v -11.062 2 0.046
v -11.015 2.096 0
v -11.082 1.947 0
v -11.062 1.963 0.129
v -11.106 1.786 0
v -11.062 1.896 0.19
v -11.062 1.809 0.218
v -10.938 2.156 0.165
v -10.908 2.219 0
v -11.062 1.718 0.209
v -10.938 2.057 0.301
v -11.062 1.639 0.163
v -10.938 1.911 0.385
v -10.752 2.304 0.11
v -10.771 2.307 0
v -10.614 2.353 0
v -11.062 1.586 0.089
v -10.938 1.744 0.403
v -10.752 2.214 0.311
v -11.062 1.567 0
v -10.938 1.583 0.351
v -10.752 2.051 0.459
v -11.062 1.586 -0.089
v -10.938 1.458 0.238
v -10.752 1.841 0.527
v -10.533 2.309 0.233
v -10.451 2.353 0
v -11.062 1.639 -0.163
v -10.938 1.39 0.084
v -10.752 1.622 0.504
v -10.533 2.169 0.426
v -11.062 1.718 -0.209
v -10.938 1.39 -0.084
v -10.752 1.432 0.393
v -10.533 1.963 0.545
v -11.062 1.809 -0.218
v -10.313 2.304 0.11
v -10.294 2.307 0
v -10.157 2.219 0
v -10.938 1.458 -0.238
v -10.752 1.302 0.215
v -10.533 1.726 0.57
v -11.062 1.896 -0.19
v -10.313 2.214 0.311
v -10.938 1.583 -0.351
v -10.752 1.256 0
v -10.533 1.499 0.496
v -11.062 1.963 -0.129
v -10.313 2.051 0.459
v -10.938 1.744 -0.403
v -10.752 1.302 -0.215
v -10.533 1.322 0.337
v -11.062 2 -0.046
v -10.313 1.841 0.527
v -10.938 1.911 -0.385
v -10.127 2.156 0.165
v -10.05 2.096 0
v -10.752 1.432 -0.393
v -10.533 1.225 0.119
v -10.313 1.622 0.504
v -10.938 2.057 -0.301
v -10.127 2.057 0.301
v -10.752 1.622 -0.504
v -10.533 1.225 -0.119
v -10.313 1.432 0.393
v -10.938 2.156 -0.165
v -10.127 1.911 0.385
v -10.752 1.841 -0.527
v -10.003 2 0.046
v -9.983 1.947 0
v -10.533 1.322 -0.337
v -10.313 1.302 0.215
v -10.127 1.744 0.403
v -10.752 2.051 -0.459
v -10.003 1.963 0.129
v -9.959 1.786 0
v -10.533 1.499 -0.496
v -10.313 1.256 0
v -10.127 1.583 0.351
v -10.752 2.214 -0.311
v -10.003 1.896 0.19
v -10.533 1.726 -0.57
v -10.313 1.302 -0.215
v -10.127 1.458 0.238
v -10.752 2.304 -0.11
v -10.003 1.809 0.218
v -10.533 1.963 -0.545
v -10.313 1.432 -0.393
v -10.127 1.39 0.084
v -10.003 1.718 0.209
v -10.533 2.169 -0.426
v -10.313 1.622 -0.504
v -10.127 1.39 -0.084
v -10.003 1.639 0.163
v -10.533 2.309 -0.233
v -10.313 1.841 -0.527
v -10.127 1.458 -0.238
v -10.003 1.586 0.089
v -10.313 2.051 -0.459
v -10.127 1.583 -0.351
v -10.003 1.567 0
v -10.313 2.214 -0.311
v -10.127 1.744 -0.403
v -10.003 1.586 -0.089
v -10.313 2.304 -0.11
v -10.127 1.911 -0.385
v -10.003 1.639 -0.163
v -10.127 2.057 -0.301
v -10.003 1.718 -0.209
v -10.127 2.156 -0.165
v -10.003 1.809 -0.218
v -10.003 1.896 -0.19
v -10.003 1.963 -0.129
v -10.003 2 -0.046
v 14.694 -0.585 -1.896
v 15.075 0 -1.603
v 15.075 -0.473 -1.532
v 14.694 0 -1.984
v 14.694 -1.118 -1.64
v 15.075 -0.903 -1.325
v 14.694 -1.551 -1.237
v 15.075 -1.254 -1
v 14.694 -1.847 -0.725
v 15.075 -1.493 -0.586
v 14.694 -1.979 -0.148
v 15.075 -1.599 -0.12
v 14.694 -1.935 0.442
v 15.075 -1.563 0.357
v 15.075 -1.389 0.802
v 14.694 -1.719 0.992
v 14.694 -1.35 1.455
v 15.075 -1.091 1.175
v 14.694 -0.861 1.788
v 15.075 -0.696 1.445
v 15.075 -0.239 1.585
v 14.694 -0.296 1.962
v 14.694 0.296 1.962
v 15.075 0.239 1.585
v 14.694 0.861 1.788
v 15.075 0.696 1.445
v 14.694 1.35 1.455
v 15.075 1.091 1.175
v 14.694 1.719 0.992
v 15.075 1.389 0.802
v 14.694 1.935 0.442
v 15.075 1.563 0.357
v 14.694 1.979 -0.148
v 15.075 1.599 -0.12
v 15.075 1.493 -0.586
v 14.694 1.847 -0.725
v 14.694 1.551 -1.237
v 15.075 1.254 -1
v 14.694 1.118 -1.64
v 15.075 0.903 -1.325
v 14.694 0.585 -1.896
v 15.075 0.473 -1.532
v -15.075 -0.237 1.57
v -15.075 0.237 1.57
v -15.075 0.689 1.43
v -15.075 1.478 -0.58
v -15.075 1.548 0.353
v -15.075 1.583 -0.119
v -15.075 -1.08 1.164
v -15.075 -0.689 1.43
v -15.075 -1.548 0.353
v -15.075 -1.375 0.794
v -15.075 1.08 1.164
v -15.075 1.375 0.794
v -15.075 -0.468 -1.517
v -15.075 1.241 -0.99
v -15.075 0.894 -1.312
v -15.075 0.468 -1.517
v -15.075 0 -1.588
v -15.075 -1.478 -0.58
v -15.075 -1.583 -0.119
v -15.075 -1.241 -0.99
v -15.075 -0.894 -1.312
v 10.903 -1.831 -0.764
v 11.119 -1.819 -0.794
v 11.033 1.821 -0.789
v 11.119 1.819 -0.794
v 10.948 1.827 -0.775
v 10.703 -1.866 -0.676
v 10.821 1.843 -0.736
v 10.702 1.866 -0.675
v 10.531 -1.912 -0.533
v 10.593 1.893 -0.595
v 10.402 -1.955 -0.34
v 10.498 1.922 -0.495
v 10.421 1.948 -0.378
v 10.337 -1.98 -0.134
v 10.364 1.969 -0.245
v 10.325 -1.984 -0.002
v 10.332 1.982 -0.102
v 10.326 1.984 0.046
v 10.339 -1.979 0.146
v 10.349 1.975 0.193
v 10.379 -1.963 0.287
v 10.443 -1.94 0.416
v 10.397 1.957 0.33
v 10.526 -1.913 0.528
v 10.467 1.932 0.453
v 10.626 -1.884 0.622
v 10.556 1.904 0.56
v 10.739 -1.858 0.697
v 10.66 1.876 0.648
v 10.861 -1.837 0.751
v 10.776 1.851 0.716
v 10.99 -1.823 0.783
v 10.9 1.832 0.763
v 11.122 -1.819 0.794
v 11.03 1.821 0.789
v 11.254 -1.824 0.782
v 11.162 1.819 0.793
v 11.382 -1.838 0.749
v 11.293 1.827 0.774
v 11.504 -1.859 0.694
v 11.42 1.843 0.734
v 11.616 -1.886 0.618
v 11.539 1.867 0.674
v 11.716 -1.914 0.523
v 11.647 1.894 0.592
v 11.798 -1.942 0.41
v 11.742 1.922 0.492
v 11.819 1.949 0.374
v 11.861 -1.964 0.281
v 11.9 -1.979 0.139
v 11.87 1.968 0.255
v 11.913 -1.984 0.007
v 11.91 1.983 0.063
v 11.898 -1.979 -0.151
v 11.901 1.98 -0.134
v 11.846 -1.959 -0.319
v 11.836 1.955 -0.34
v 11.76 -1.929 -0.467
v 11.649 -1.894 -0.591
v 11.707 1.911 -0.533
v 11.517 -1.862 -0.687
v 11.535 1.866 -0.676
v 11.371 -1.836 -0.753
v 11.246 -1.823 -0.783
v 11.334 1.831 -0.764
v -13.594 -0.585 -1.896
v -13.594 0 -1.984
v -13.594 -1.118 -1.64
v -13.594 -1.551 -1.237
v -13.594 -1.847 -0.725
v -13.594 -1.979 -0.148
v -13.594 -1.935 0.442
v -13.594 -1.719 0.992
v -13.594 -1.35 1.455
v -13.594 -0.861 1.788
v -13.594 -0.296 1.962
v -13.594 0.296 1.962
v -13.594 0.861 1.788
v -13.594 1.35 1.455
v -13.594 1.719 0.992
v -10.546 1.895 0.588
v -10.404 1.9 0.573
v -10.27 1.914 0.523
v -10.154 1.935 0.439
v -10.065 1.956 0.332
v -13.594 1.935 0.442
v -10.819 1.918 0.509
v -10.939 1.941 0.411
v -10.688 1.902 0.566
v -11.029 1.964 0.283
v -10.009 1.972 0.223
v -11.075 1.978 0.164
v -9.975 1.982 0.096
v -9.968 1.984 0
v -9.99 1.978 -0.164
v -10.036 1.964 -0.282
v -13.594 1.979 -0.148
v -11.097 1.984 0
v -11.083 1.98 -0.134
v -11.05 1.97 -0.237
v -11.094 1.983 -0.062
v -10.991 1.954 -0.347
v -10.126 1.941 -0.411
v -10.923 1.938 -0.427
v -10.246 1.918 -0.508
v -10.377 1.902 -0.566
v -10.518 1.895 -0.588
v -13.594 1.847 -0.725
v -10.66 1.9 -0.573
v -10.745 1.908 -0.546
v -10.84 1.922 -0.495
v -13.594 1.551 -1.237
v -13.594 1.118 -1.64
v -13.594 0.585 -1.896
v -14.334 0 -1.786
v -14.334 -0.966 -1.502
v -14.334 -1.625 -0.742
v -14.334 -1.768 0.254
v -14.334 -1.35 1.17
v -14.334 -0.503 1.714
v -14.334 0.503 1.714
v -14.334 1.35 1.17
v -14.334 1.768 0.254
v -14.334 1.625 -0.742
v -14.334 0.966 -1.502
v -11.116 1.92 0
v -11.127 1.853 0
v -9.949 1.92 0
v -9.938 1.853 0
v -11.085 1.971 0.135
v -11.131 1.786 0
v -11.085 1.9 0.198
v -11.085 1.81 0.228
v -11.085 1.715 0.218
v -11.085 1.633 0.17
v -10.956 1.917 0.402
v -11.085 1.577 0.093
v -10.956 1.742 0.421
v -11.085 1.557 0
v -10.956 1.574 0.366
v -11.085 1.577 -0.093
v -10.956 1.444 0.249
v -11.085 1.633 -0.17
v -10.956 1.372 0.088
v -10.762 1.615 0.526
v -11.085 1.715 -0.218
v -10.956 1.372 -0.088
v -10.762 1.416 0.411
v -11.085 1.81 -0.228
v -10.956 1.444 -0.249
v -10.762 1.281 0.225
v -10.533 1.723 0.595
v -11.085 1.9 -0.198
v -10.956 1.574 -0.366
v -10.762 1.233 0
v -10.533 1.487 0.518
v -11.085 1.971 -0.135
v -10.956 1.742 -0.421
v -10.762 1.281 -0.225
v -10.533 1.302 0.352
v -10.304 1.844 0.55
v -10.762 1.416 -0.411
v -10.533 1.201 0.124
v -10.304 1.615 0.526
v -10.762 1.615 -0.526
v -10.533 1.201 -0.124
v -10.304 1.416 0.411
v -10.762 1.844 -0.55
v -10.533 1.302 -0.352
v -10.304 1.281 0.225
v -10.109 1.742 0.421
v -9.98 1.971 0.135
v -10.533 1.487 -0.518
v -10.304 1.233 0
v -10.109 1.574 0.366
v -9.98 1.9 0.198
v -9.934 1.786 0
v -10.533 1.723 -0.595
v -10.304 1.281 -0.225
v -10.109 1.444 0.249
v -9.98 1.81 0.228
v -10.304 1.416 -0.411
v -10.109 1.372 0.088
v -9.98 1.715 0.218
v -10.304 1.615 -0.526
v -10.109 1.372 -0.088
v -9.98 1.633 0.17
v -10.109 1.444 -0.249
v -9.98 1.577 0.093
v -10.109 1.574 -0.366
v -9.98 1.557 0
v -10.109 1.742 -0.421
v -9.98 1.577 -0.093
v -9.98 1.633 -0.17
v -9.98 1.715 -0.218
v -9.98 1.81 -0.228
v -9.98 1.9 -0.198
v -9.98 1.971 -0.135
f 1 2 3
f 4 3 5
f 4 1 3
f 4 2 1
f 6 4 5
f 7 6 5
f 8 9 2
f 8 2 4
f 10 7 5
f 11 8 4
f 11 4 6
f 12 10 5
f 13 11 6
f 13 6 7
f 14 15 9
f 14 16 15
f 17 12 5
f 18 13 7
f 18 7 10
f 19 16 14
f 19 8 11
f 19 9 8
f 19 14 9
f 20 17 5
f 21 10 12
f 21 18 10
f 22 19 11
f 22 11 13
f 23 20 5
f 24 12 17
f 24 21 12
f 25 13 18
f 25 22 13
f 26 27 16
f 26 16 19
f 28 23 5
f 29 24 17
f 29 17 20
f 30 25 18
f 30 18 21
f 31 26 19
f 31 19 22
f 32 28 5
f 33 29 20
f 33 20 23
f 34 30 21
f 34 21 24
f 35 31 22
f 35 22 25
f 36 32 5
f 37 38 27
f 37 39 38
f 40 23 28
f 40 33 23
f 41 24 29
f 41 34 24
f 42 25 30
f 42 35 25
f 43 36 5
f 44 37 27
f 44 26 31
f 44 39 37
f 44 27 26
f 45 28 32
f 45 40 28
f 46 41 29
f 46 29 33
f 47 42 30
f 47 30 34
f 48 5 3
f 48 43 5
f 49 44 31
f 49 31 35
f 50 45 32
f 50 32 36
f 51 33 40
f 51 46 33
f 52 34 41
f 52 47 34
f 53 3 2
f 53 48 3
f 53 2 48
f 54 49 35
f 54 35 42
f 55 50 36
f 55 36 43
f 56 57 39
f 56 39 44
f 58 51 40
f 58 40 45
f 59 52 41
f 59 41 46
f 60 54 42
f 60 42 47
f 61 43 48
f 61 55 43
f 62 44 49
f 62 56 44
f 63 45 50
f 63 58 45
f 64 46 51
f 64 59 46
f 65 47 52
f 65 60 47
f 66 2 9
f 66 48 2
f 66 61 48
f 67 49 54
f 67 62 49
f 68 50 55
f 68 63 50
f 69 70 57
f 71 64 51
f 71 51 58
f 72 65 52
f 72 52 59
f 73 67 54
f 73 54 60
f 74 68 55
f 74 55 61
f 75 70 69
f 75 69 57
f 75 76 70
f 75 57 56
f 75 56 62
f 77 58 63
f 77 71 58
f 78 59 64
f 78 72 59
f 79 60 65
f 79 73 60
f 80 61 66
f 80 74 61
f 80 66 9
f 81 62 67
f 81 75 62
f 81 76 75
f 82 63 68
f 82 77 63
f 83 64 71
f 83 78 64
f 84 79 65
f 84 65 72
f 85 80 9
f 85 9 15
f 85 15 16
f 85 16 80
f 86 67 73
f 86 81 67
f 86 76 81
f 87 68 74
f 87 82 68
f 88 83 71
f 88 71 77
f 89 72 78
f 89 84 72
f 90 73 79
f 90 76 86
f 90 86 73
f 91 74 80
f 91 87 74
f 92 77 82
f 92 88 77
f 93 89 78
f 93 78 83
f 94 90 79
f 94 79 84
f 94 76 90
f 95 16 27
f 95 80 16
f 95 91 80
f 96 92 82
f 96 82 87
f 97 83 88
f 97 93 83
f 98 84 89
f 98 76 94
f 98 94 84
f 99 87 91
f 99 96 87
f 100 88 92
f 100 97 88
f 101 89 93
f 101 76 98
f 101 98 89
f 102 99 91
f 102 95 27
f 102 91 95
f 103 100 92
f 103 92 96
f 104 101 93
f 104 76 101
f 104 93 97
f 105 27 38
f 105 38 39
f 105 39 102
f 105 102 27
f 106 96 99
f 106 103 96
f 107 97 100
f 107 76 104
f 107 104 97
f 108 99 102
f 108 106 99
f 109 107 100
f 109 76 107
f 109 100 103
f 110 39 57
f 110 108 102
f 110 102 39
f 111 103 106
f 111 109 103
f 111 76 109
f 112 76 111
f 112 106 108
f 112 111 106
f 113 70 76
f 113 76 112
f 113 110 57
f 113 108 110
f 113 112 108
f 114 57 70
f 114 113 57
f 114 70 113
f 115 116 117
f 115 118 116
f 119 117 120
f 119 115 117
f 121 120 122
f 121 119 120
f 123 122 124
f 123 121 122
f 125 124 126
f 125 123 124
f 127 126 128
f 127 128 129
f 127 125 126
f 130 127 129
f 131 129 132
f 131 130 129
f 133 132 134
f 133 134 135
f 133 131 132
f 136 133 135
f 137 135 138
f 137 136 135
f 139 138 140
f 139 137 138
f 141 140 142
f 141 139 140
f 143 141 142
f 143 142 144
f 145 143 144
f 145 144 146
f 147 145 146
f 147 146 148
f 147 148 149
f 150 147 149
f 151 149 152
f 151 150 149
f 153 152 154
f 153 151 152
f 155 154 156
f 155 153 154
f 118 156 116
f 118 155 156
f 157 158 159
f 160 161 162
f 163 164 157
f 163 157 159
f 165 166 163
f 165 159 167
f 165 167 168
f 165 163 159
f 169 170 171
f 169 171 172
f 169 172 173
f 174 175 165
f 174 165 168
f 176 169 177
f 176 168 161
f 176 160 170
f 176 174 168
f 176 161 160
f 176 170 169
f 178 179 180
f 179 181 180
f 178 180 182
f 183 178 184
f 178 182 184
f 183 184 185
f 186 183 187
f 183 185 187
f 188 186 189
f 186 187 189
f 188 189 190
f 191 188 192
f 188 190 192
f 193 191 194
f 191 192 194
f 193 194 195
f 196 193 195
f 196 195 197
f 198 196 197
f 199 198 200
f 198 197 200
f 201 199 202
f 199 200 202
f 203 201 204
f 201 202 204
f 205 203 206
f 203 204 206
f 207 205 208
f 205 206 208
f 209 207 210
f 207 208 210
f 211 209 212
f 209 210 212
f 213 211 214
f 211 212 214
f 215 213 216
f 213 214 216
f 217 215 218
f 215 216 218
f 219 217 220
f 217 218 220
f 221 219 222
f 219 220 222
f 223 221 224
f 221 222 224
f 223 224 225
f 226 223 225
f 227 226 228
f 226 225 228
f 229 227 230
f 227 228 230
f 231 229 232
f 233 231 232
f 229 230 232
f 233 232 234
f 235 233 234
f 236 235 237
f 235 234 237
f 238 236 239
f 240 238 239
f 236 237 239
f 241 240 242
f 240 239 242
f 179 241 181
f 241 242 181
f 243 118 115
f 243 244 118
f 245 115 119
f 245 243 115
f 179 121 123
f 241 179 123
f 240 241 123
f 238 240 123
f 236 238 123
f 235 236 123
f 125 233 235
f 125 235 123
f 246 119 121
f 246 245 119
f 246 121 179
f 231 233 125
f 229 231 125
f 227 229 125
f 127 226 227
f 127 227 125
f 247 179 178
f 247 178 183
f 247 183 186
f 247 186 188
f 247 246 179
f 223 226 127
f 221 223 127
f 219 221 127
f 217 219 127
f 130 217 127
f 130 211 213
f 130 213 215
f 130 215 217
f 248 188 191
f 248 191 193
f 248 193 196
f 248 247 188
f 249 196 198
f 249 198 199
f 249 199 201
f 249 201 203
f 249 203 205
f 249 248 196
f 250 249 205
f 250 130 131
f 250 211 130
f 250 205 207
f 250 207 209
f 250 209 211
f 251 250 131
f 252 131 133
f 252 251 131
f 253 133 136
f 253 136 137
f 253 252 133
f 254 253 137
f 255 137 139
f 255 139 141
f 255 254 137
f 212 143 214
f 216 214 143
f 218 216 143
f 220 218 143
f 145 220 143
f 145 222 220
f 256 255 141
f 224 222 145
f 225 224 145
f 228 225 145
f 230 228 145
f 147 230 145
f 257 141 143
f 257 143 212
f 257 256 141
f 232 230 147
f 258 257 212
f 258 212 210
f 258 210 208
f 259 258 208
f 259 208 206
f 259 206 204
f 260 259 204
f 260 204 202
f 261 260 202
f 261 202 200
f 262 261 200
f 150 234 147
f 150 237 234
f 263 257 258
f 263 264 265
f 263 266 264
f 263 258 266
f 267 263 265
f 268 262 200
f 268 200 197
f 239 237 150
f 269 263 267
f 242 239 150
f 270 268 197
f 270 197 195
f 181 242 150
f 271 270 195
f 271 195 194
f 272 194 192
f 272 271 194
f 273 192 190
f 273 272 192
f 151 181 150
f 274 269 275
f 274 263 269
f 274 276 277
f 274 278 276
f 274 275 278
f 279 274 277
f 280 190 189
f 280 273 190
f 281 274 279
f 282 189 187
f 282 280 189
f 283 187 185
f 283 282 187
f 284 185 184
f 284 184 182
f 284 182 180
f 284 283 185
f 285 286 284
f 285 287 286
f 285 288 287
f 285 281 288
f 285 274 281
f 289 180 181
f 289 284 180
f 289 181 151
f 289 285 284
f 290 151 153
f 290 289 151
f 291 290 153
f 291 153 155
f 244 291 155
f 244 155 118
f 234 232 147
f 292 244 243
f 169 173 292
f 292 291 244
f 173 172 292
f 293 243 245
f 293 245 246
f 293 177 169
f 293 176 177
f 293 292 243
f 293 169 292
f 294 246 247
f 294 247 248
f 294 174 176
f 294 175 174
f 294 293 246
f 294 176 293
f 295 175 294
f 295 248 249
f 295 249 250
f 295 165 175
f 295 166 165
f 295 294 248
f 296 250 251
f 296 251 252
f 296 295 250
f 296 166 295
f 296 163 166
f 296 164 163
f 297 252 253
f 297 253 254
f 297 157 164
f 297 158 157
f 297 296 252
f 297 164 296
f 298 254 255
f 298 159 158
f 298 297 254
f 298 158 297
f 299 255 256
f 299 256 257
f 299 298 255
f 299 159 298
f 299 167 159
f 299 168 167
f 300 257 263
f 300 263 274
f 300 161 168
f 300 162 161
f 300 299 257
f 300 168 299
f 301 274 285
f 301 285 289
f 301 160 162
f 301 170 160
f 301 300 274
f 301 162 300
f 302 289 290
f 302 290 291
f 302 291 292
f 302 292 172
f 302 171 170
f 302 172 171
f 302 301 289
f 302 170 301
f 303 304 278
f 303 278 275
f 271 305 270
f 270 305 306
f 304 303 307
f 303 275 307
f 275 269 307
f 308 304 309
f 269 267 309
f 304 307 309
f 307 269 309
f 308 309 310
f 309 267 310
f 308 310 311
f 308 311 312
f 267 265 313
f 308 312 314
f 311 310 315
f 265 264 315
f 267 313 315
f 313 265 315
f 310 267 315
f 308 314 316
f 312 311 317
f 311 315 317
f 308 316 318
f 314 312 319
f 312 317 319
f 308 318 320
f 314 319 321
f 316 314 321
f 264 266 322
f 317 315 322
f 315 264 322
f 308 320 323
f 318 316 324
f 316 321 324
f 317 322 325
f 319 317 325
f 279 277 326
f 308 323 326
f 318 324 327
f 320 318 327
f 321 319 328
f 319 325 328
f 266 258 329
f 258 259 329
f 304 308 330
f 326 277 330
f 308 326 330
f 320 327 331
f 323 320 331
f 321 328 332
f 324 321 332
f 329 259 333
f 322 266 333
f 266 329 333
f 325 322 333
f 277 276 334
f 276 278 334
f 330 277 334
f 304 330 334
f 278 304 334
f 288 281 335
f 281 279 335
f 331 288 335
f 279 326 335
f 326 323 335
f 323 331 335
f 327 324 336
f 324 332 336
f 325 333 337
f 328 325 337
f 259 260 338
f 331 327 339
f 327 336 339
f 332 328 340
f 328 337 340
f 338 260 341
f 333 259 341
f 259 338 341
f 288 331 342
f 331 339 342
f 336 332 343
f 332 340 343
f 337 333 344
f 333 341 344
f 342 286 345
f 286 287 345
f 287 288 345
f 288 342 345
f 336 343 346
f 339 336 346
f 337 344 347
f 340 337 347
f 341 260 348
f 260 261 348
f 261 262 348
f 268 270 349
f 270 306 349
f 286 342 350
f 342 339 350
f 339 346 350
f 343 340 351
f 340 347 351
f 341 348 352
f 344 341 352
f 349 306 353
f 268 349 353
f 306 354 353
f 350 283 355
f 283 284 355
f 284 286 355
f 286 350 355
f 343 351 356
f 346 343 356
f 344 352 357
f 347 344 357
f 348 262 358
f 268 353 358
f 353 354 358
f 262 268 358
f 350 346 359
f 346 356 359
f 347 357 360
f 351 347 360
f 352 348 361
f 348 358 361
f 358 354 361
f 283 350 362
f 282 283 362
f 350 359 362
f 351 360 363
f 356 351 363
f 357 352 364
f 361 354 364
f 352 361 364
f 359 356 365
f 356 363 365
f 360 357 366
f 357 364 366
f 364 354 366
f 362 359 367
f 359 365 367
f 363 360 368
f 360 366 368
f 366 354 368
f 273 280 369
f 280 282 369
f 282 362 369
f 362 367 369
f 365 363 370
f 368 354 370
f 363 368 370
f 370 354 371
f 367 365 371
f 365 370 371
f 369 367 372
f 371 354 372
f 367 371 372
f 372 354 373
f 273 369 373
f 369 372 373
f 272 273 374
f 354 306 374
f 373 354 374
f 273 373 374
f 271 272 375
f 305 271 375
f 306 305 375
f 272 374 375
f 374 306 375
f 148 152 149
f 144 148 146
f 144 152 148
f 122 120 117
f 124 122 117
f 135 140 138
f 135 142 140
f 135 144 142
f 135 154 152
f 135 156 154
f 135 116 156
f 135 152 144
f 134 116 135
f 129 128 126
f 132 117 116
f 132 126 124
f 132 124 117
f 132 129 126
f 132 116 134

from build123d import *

# Parameters (mm, degrees)
SKETCH4_W = 0.79375
SKETCH4_H = 3.96875


with BuildPart() as part:
    # Sketch1 → Revolve1 (revolve)
    with BuildSketch(Plane.XY, mode=Mode.PRIVATE) as revolve1_sk:
        Polygon((15.0749, 1.603375), (14.6939, 1.984375), (-13.593742336, 1.984375), (-15.0749, 1.5875), (-15.0749, 0), (15.0749, 0), align=None)
    revolve(revolve1_sk.sketch.rotate(Axis((39.811445486, 0, 0), (-1, 0, 0)), 90), axis=Axis((39.811445486, 0, 0), (-1, 0, 0)))

    # Sketch2 → Cut-Revolve1 (revolve, cut)
    with BuildSketch(Plane.XY):
        with BuildLine():
            Line((-9.934047917, 1.7859375), (-11.131022917, 1.7859375))
            ThreePointArc((-11.131022917, 1.7859375), (-10.532535417, 2.384425), (-9.934047917, 1.7859375))
        make_face()
    revolve(axis=Axis((-9.934047917, 1.7859375, 0), (1, 0, 0)), mode=Mode.SUBTRACT)

    # Sketch4 → Cut-Revolve2 (revolve, cut)
    with BuildSketch(Plane.XY, mode=Mode.PRIVATE) as cut_revolve2_sk:
        with Locations((11.515725, 0)):
            Rectangle(SKETCH4_W, SKETCH4_H)
    revolve(cut_revolve2_sk.sketch.rotate(Axis((11.11885, -1.984375, 0), (0, 1, 0)), 90), axis=Axis((11.11885, -1.984375, 0), (0, 1, 0)), mode=Mode.SUBTRACT)


with BuildPart() as body_2:
    # Sketch3 → Revolve2 (revolve)
    with BuildSketch(Plane.XY):
        with BuildLine():
            Line((-9.959447917, 1.7859375), (-11.105622917, 1.7859375))
            ThreePointArc((-11.105622917, 1.7859375), (-10.532535417, 2.359025), (-9.959447917, 1.7859375))
        make_face()
    revolve(axis=Axis((-9.959447917, 1.7859375, 0), (1, 0, 0)))


solid = Compound([part.part, body_2.part])
